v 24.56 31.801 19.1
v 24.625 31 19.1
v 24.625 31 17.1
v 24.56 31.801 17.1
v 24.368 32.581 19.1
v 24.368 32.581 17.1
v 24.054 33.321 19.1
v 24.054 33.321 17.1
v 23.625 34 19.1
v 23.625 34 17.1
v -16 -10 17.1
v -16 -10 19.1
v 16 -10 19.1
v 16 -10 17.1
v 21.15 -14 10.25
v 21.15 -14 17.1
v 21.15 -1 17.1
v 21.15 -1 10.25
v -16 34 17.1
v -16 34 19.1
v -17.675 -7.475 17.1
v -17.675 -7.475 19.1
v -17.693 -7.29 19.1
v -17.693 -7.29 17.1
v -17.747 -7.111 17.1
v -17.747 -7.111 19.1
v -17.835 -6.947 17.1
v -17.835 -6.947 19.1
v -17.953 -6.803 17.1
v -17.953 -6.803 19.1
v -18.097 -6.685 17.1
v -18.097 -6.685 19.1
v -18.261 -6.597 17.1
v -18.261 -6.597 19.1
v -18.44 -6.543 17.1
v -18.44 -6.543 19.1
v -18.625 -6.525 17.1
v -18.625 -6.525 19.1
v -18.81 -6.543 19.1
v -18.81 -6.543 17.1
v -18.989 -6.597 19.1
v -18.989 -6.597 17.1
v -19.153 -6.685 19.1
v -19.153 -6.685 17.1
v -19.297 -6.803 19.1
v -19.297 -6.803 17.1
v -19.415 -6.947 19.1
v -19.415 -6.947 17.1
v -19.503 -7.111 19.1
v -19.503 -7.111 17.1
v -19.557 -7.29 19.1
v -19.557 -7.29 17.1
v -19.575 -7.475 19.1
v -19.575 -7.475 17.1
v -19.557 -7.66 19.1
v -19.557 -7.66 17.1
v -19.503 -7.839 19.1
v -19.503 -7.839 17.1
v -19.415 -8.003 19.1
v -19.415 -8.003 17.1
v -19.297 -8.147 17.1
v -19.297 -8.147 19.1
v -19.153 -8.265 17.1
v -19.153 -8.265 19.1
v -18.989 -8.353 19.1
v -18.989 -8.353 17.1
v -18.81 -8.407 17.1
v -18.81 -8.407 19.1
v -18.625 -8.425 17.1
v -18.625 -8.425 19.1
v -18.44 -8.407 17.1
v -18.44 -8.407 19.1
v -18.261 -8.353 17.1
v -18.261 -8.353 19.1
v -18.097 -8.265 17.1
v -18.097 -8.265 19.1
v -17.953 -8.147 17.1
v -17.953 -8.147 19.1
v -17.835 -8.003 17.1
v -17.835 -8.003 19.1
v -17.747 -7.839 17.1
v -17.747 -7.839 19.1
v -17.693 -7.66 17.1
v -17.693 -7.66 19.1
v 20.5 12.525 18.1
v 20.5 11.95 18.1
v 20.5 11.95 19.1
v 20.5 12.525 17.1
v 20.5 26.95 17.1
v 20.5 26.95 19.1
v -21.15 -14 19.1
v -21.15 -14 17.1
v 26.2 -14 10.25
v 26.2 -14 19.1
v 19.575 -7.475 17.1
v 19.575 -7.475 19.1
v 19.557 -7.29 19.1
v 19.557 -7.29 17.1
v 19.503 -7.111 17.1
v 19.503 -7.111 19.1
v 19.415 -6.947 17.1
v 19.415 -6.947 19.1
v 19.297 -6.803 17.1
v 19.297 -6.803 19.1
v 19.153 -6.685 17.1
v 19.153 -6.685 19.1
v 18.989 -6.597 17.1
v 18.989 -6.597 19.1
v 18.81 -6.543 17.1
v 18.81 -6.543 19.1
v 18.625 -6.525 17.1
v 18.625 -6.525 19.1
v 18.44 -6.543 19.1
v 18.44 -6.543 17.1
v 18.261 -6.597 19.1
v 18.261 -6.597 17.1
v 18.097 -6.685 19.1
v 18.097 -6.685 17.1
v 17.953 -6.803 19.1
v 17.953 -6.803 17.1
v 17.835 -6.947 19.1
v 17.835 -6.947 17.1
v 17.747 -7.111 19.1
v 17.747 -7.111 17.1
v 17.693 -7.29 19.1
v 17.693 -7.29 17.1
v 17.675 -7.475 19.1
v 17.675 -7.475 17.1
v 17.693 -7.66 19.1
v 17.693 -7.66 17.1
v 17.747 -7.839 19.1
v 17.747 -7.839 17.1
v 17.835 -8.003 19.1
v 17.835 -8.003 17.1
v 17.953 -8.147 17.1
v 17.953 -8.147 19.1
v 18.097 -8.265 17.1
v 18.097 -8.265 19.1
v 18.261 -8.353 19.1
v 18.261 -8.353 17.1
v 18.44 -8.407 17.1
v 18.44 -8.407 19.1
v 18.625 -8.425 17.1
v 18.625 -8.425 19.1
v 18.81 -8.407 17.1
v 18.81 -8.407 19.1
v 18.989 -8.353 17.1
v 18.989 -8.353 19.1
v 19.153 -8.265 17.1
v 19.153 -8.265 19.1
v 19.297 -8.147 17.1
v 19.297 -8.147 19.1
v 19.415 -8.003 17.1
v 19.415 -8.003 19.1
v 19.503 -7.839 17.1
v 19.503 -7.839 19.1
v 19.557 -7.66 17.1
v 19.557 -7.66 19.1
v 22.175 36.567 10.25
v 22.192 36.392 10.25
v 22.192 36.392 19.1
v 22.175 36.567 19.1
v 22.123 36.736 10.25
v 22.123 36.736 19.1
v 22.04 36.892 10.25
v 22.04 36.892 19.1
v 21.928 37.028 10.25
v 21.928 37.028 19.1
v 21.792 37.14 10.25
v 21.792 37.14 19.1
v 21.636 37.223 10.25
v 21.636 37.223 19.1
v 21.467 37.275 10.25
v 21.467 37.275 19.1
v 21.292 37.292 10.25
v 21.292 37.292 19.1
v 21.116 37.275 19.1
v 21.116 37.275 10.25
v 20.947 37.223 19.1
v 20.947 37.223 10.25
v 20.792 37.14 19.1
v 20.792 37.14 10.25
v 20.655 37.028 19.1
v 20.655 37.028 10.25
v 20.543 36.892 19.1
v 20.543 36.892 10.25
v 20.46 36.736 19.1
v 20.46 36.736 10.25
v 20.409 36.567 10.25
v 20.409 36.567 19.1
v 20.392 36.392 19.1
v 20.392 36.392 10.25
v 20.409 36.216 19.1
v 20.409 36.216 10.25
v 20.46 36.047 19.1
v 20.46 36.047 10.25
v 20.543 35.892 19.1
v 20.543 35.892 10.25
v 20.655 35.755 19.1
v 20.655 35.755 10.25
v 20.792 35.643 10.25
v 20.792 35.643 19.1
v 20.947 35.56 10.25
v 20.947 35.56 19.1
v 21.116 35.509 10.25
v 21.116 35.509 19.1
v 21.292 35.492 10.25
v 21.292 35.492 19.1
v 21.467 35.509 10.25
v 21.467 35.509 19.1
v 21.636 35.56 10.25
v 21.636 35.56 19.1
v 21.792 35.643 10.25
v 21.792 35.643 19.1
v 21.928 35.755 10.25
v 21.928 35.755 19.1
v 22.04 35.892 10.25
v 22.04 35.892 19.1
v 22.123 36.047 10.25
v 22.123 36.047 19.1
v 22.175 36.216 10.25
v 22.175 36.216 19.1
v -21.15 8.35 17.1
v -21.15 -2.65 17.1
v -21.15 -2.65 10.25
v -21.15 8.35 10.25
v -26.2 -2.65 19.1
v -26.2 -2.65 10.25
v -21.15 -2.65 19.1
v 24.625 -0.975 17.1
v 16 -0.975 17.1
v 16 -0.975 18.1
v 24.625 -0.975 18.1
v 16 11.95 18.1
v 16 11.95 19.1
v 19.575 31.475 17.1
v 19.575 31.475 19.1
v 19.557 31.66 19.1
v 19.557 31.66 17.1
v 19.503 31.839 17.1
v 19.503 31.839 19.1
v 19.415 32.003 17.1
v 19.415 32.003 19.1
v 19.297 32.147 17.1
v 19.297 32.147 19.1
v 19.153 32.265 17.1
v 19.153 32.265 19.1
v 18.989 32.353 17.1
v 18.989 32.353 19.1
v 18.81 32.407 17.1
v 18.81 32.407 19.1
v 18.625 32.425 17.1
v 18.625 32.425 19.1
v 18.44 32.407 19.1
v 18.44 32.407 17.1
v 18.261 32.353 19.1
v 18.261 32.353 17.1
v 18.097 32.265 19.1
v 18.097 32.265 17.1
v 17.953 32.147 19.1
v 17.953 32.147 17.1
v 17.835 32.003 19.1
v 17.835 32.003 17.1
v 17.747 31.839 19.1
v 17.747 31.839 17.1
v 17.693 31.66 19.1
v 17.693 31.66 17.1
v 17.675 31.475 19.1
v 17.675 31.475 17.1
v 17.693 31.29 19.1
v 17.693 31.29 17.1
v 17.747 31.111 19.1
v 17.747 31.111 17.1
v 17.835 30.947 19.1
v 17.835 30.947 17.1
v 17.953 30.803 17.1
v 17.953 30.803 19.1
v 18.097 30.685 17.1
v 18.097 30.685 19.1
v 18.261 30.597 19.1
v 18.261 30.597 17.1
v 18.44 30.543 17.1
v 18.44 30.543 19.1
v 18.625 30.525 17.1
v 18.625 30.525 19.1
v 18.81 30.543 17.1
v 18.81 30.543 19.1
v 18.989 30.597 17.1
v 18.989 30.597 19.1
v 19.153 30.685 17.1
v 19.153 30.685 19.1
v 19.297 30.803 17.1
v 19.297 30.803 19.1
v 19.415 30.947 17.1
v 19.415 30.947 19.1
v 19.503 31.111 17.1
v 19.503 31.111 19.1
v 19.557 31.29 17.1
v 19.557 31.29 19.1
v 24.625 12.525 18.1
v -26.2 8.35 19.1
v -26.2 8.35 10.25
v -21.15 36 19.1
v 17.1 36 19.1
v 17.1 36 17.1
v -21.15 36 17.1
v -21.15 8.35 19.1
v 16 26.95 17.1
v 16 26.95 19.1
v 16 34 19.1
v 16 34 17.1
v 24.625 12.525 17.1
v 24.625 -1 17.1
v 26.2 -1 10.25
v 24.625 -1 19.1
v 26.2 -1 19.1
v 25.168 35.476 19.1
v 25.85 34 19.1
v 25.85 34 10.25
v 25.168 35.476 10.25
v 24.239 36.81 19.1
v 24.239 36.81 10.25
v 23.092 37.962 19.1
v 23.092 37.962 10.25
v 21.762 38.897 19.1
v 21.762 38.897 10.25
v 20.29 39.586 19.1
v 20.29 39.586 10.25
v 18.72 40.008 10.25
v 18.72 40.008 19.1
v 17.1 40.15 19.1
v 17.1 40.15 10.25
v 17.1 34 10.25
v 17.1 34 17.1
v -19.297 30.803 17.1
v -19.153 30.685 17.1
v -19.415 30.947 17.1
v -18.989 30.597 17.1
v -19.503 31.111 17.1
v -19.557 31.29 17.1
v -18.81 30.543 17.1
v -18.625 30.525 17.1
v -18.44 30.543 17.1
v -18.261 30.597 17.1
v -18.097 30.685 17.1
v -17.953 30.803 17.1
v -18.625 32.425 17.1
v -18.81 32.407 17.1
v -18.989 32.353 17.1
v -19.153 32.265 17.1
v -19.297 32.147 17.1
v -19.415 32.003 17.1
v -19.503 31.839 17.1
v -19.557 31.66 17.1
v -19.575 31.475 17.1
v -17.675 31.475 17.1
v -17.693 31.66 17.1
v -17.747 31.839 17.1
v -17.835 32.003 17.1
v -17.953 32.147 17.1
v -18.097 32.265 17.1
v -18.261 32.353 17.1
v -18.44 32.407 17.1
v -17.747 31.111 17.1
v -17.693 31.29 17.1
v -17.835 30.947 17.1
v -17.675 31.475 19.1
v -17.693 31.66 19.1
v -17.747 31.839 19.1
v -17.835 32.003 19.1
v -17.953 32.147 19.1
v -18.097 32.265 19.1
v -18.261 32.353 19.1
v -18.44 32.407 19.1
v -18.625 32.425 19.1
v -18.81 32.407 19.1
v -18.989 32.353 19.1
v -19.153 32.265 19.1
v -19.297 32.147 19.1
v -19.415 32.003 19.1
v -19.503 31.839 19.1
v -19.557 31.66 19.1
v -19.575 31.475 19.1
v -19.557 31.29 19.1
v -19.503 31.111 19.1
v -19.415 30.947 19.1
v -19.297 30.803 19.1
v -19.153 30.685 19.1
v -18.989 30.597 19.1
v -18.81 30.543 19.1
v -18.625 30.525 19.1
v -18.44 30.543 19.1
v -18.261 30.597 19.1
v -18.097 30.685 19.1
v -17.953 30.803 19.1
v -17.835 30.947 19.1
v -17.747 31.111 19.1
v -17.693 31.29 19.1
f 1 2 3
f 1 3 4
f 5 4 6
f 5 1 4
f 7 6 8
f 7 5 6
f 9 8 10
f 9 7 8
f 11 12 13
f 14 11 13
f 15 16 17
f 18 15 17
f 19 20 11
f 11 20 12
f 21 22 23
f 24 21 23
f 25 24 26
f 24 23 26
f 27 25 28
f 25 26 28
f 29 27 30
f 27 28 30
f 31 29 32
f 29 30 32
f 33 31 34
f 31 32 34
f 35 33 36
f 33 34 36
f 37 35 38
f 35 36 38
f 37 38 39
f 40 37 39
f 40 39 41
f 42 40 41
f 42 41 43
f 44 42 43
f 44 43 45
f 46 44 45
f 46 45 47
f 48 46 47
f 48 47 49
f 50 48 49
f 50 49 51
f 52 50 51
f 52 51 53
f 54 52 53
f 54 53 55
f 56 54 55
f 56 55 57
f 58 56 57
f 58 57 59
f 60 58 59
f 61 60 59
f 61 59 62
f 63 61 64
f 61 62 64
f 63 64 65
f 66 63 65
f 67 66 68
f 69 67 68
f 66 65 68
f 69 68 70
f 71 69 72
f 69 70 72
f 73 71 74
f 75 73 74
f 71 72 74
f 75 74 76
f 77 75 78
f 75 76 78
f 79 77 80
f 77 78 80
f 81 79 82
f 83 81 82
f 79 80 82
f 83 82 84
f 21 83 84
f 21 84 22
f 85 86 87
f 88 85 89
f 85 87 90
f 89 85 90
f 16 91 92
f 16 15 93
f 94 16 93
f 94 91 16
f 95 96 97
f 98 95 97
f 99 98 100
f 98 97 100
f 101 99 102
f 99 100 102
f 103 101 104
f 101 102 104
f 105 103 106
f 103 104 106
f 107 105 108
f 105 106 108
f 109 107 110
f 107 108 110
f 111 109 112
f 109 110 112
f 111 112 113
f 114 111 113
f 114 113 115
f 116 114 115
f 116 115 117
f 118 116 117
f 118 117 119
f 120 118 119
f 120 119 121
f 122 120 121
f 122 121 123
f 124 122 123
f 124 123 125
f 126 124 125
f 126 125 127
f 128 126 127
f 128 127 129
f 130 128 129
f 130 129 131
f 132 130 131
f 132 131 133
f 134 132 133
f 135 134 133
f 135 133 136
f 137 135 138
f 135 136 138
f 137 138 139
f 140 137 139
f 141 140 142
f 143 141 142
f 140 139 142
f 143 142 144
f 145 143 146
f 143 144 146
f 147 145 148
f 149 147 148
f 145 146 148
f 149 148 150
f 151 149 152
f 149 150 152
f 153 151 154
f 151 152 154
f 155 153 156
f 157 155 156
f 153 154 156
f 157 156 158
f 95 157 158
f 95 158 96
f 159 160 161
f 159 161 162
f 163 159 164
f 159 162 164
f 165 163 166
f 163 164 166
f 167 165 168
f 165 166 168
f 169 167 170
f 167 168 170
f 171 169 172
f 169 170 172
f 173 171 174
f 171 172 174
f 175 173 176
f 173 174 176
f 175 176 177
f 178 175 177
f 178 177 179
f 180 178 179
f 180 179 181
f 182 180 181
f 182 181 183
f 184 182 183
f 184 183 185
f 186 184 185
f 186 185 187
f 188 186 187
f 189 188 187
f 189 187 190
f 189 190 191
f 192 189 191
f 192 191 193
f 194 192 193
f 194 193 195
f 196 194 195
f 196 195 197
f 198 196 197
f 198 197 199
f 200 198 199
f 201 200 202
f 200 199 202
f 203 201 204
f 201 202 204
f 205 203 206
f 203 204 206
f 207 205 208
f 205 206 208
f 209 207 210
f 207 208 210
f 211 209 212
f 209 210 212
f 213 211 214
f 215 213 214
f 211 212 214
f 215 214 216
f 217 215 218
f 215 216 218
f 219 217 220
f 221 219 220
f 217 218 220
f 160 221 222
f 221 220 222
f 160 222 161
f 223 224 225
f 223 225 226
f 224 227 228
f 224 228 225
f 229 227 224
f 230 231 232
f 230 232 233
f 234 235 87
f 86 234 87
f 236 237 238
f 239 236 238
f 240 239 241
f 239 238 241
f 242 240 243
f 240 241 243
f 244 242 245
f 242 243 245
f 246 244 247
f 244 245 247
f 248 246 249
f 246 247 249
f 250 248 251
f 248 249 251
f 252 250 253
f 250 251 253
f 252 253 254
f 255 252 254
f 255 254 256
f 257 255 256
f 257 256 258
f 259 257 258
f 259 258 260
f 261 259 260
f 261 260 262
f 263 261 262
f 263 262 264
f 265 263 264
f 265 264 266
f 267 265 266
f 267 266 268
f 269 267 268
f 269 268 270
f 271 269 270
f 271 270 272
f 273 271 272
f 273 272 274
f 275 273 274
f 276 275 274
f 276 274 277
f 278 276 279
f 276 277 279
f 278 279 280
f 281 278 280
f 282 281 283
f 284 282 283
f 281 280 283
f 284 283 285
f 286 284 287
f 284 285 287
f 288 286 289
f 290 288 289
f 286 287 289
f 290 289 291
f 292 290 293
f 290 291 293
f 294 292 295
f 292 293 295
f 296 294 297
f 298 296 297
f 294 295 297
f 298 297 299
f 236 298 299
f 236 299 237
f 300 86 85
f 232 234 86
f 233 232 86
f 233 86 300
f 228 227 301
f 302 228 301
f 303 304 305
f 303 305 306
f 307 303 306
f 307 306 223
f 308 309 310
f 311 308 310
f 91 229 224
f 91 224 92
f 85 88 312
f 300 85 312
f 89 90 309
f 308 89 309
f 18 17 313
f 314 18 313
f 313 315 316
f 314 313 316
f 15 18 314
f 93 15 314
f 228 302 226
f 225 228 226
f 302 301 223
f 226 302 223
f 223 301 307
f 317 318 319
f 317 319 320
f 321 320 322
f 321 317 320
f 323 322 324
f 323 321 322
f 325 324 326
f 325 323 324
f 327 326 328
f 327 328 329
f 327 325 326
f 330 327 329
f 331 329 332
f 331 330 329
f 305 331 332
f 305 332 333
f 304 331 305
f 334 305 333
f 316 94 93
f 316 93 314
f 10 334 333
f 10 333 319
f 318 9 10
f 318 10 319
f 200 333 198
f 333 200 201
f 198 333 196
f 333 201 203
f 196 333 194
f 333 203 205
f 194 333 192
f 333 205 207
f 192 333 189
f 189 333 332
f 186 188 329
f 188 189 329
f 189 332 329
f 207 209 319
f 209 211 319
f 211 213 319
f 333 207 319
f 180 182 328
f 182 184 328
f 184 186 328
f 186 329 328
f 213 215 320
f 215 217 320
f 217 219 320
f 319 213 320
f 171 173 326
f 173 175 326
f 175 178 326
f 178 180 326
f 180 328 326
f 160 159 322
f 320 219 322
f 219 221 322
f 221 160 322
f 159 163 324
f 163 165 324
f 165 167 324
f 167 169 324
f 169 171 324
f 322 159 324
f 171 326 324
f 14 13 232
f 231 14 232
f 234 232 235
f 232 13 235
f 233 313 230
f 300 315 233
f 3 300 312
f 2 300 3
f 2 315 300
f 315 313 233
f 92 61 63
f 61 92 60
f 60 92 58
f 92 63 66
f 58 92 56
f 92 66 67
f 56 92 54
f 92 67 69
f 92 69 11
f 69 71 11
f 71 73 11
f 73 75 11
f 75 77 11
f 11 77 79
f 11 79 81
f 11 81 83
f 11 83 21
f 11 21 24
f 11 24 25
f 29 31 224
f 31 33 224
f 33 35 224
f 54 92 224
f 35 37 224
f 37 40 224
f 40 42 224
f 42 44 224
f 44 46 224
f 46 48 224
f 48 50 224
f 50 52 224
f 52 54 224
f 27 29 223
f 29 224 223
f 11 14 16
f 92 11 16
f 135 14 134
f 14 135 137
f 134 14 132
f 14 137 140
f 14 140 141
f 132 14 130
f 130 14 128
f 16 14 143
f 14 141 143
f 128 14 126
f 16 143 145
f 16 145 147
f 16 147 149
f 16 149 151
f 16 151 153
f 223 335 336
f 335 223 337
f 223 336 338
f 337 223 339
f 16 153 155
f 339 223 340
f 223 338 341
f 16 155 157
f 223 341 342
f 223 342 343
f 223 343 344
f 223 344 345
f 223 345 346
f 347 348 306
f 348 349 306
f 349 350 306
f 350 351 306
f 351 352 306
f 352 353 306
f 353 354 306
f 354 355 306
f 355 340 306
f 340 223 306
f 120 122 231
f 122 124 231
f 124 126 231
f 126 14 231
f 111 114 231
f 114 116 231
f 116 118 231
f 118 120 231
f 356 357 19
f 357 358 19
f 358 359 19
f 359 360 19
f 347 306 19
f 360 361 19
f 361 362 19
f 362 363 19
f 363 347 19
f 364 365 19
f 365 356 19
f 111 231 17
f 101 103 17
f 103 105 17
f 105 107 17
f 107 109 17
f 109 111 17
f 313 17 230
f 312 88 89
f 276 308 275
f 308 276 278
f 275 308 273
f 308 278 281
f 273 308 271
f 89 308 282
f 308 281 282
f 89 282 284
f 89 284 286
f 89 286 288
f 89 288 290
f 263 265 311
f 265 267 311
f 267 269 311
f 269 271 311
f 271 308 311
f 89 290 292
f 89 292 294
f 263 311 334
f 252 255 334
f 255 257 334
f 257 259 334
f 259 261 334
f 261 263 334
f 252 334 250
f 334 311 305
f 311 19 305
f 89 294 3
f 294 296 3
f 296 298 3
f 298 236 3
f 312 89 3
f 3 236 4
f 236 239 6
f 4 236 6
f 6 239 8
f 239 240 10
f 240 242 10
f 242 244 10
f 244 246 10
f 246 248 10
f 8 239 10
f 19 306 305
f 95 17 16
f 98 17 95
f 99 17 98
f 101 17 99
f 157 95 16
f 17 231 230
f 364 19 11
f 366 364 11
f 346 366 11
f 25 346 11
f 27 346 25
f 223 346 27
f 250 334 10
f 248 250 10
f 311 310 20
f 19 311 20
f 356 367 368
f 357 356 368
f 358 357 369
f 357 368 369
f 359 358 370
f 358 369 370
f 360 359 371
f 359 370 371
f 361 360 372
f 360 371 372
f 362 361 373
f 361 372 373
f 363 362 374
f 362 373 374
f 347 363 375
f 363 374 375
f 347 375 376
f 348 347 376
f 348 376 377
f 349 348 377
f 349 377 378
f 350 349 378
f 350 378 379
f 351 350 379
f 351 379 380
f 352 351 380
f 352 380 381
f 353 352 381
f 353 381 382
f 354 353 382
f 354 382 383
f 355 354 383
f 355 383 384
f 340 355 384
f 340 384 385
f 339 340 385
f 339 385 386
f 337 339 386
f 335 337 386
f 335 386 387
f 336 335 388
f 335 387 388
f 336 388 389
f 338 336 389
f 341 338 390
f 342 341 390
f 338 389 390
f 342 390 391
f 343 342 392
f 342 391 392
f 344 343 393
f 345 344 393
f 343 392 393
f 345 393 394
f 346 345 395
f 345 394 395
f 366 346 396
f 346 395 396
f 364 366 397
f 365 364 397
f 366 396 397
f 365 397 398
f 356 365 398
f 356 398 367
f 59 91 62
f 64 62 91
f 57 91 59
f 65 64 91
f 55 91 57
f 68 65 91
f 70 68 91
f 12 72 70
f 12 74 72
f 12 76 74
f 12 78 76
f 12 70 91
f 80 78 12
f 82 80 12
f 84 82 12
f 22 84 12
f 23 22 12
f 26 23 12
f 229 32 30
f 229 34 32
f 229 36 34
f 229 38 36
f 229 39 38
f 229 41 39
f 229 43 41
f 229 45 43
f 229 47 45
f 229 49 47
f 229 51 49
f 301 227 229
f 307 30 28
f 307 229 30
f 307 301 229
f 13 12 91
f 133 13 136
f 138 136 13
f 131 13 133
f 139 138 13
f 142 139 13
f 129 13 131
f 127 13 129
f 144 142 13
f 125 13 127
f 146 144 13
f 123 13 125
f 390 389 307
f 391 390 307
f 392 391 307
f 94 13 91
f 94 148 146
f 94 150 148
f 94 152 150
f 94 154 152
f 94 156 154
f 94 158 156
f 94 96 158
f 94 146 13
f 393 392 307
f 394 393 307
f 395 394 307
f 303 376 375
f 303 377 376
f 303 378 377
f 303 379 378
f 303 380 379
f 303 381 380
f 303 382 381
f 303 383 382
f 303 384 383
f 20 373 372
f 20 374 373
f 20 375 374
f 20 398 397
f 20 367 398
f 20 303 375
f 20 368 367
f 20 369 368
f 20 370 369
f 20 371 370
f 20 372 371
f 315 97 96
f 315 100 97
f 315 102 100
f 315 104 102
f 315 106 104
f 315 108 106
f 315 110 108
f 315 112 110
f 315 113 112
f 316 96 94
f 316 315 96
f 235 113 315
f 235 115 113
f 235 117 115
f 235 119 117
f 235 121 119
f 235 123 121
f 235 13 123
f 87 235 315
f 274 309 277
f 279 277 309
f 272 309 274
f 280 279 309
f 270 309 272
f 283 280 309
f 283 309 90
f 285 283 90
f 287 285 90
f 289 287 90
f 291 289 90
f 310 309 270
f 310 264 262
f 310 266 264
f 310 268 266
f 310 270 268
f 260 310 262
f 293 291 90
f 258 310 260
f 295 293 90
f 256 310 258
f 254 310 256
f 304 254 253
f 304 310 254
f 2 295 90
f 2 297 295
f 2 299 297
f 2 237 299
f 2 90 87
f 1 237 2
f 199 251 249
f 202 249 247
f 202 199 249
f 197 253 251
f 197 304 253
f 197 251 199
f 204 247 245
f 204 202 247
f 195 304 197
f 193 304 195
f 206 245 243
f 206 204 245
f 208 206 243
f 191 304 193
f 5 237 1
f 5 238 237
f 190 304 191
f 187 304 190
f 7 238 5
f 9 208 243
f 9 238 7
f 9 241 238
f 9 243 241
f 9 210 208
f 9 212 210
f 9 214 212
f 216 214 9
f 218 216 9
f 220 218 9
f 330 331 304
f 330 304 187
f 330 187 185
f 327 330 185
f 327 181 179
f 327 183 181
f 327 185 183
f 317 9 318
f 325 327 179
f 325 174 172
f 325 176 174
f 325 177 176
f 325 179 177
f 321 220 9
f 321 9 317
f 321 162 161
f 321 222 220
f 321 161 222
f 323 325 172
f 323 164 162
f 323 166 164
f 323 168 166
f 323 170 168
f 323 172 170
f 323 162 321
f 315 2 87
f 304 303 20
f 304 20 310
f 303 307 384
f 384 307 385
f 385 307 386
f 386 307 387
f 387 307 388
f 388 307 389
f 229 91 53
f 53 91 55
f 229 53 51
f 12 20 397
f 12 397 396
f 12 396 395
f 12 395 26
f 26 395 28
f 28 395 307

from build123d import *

# Parameters (mm, degrees)
PAD035_DEPTH    = 2
POCKET034_DEPTH = 5
SKETCH080_R     = 0.95
POCKET035_DEPTH = 5
SKETCH081_W     = 5.05
SKETCH081_H     = 13
SKETCH081_H_2   = 11
PAD041_DEPTH    = 8.85
SKETCH082_R     = 0.9
HOLE_DEPTH      = 25
SKETCH086_W     = 8.625
SKETCH086_H     = 13.5
POCKET036_DEPTH = 1


with BuildPart() as part:
    # Sketch071 → Pad035 (new body)
    with BuildSketch(Plane.XY):
        with BuildLine():
            Line((-21.15, 36), (-21.15, -14))
            Line((-21.15, -14), (24.625, -14))
            Line((24.625, -14), (24.625, 31))
            ThreePointArc((24.625, 31), (23.160534, 34.535534), (19.625, 36))
            Line((19.625, 36), (-21.15, 36))
        make_face()
    extrude(amount=-PAD035_DEPTH)

    # Sketch079 (on Face6 of Pad035) → Pocket034 (cut)
    with BuildSketch(Plane.XY):
        Polygon((-16, 34), (-16, -10), (16, -10), (16, 11.95), (20.5, 11.95), (20.5, 26.95), (16, 26.95), (16, 34), align=None)
    extrude(amount=-POCKET034_DEPTH, mode=Mode.SUBTRACT)

    # Sketch080 (on Face4 of Pocket034) → Pocket035 (cut)
    with BuildSketch(Plane.XY):
        with Locations((-18.625, 31.475)):
            Circle(SKETCH080_R)
        with Locations((18.625, 31.475)):
            Circle(SKETCH080_R)
        with Locations((18.625, -7.475)):
            Circle(SKETCH080_R)
        with Locations((-18.625, -7.475)):
            Circle(SKETCH080_R)
    extrude(amount=-POCKET035_DEPTH, mode=Mode.SUBTRACT)

    # Sketch081 (on Face4 of Pocket035) → Pad041 (join)
    with BuildSketch(Plane.XY):
        with Locations((23.675, -7.5)):
            Rectangle(SKETCH081_W, SKETCH081_H)
        with Locations((-23.675, 2.850002)):
            Rectangle(SKETCH081_W, SKETCH081_H_2)
        with BuildLine():
            ThreePointArc((25.850286, 34), (22.447663, 38.458712), (17.1, 40.15))
            Line((17.1, 36), (17.1, 40.15))
            Line((17.1, 36), (17.1, 34))
            Line((17.1, 34), (25.850286, 34))
        make_face()
    extrude(amount=-PAD041_DEPTH)

    # Sketch082 (on Face32 of Pad041) → Hole (cut)
    with BuildSketch(Plane.XY):
        with Locations((21.291797, 36.391807)):
            Circle(SKETCH082_R)
    extrude(amount=-HOLE_DEPTH, mode=Mode.SUBTRACT)

    # Sketch086 (on Face4 of Hole) → Pocket036 (cut)
    with BuildSketch(Plane(origin=(0, 0, -2), x_dir=(1, 0, 0), z_dir=(0, 0, -1))):
        with Locations((20.3125, -5.775)):
            Rectangle(SKETCH086_W, SKETCH086_H)
    extrude(amount=-POCKET036_DEPTH, mode=Mode.SUBTRACT)


with BuildPart() as part_1:
    # Body010 placement: moved
    add(part.part.moved(Location((0, 0, 19.1))))


solid = part_1.part
